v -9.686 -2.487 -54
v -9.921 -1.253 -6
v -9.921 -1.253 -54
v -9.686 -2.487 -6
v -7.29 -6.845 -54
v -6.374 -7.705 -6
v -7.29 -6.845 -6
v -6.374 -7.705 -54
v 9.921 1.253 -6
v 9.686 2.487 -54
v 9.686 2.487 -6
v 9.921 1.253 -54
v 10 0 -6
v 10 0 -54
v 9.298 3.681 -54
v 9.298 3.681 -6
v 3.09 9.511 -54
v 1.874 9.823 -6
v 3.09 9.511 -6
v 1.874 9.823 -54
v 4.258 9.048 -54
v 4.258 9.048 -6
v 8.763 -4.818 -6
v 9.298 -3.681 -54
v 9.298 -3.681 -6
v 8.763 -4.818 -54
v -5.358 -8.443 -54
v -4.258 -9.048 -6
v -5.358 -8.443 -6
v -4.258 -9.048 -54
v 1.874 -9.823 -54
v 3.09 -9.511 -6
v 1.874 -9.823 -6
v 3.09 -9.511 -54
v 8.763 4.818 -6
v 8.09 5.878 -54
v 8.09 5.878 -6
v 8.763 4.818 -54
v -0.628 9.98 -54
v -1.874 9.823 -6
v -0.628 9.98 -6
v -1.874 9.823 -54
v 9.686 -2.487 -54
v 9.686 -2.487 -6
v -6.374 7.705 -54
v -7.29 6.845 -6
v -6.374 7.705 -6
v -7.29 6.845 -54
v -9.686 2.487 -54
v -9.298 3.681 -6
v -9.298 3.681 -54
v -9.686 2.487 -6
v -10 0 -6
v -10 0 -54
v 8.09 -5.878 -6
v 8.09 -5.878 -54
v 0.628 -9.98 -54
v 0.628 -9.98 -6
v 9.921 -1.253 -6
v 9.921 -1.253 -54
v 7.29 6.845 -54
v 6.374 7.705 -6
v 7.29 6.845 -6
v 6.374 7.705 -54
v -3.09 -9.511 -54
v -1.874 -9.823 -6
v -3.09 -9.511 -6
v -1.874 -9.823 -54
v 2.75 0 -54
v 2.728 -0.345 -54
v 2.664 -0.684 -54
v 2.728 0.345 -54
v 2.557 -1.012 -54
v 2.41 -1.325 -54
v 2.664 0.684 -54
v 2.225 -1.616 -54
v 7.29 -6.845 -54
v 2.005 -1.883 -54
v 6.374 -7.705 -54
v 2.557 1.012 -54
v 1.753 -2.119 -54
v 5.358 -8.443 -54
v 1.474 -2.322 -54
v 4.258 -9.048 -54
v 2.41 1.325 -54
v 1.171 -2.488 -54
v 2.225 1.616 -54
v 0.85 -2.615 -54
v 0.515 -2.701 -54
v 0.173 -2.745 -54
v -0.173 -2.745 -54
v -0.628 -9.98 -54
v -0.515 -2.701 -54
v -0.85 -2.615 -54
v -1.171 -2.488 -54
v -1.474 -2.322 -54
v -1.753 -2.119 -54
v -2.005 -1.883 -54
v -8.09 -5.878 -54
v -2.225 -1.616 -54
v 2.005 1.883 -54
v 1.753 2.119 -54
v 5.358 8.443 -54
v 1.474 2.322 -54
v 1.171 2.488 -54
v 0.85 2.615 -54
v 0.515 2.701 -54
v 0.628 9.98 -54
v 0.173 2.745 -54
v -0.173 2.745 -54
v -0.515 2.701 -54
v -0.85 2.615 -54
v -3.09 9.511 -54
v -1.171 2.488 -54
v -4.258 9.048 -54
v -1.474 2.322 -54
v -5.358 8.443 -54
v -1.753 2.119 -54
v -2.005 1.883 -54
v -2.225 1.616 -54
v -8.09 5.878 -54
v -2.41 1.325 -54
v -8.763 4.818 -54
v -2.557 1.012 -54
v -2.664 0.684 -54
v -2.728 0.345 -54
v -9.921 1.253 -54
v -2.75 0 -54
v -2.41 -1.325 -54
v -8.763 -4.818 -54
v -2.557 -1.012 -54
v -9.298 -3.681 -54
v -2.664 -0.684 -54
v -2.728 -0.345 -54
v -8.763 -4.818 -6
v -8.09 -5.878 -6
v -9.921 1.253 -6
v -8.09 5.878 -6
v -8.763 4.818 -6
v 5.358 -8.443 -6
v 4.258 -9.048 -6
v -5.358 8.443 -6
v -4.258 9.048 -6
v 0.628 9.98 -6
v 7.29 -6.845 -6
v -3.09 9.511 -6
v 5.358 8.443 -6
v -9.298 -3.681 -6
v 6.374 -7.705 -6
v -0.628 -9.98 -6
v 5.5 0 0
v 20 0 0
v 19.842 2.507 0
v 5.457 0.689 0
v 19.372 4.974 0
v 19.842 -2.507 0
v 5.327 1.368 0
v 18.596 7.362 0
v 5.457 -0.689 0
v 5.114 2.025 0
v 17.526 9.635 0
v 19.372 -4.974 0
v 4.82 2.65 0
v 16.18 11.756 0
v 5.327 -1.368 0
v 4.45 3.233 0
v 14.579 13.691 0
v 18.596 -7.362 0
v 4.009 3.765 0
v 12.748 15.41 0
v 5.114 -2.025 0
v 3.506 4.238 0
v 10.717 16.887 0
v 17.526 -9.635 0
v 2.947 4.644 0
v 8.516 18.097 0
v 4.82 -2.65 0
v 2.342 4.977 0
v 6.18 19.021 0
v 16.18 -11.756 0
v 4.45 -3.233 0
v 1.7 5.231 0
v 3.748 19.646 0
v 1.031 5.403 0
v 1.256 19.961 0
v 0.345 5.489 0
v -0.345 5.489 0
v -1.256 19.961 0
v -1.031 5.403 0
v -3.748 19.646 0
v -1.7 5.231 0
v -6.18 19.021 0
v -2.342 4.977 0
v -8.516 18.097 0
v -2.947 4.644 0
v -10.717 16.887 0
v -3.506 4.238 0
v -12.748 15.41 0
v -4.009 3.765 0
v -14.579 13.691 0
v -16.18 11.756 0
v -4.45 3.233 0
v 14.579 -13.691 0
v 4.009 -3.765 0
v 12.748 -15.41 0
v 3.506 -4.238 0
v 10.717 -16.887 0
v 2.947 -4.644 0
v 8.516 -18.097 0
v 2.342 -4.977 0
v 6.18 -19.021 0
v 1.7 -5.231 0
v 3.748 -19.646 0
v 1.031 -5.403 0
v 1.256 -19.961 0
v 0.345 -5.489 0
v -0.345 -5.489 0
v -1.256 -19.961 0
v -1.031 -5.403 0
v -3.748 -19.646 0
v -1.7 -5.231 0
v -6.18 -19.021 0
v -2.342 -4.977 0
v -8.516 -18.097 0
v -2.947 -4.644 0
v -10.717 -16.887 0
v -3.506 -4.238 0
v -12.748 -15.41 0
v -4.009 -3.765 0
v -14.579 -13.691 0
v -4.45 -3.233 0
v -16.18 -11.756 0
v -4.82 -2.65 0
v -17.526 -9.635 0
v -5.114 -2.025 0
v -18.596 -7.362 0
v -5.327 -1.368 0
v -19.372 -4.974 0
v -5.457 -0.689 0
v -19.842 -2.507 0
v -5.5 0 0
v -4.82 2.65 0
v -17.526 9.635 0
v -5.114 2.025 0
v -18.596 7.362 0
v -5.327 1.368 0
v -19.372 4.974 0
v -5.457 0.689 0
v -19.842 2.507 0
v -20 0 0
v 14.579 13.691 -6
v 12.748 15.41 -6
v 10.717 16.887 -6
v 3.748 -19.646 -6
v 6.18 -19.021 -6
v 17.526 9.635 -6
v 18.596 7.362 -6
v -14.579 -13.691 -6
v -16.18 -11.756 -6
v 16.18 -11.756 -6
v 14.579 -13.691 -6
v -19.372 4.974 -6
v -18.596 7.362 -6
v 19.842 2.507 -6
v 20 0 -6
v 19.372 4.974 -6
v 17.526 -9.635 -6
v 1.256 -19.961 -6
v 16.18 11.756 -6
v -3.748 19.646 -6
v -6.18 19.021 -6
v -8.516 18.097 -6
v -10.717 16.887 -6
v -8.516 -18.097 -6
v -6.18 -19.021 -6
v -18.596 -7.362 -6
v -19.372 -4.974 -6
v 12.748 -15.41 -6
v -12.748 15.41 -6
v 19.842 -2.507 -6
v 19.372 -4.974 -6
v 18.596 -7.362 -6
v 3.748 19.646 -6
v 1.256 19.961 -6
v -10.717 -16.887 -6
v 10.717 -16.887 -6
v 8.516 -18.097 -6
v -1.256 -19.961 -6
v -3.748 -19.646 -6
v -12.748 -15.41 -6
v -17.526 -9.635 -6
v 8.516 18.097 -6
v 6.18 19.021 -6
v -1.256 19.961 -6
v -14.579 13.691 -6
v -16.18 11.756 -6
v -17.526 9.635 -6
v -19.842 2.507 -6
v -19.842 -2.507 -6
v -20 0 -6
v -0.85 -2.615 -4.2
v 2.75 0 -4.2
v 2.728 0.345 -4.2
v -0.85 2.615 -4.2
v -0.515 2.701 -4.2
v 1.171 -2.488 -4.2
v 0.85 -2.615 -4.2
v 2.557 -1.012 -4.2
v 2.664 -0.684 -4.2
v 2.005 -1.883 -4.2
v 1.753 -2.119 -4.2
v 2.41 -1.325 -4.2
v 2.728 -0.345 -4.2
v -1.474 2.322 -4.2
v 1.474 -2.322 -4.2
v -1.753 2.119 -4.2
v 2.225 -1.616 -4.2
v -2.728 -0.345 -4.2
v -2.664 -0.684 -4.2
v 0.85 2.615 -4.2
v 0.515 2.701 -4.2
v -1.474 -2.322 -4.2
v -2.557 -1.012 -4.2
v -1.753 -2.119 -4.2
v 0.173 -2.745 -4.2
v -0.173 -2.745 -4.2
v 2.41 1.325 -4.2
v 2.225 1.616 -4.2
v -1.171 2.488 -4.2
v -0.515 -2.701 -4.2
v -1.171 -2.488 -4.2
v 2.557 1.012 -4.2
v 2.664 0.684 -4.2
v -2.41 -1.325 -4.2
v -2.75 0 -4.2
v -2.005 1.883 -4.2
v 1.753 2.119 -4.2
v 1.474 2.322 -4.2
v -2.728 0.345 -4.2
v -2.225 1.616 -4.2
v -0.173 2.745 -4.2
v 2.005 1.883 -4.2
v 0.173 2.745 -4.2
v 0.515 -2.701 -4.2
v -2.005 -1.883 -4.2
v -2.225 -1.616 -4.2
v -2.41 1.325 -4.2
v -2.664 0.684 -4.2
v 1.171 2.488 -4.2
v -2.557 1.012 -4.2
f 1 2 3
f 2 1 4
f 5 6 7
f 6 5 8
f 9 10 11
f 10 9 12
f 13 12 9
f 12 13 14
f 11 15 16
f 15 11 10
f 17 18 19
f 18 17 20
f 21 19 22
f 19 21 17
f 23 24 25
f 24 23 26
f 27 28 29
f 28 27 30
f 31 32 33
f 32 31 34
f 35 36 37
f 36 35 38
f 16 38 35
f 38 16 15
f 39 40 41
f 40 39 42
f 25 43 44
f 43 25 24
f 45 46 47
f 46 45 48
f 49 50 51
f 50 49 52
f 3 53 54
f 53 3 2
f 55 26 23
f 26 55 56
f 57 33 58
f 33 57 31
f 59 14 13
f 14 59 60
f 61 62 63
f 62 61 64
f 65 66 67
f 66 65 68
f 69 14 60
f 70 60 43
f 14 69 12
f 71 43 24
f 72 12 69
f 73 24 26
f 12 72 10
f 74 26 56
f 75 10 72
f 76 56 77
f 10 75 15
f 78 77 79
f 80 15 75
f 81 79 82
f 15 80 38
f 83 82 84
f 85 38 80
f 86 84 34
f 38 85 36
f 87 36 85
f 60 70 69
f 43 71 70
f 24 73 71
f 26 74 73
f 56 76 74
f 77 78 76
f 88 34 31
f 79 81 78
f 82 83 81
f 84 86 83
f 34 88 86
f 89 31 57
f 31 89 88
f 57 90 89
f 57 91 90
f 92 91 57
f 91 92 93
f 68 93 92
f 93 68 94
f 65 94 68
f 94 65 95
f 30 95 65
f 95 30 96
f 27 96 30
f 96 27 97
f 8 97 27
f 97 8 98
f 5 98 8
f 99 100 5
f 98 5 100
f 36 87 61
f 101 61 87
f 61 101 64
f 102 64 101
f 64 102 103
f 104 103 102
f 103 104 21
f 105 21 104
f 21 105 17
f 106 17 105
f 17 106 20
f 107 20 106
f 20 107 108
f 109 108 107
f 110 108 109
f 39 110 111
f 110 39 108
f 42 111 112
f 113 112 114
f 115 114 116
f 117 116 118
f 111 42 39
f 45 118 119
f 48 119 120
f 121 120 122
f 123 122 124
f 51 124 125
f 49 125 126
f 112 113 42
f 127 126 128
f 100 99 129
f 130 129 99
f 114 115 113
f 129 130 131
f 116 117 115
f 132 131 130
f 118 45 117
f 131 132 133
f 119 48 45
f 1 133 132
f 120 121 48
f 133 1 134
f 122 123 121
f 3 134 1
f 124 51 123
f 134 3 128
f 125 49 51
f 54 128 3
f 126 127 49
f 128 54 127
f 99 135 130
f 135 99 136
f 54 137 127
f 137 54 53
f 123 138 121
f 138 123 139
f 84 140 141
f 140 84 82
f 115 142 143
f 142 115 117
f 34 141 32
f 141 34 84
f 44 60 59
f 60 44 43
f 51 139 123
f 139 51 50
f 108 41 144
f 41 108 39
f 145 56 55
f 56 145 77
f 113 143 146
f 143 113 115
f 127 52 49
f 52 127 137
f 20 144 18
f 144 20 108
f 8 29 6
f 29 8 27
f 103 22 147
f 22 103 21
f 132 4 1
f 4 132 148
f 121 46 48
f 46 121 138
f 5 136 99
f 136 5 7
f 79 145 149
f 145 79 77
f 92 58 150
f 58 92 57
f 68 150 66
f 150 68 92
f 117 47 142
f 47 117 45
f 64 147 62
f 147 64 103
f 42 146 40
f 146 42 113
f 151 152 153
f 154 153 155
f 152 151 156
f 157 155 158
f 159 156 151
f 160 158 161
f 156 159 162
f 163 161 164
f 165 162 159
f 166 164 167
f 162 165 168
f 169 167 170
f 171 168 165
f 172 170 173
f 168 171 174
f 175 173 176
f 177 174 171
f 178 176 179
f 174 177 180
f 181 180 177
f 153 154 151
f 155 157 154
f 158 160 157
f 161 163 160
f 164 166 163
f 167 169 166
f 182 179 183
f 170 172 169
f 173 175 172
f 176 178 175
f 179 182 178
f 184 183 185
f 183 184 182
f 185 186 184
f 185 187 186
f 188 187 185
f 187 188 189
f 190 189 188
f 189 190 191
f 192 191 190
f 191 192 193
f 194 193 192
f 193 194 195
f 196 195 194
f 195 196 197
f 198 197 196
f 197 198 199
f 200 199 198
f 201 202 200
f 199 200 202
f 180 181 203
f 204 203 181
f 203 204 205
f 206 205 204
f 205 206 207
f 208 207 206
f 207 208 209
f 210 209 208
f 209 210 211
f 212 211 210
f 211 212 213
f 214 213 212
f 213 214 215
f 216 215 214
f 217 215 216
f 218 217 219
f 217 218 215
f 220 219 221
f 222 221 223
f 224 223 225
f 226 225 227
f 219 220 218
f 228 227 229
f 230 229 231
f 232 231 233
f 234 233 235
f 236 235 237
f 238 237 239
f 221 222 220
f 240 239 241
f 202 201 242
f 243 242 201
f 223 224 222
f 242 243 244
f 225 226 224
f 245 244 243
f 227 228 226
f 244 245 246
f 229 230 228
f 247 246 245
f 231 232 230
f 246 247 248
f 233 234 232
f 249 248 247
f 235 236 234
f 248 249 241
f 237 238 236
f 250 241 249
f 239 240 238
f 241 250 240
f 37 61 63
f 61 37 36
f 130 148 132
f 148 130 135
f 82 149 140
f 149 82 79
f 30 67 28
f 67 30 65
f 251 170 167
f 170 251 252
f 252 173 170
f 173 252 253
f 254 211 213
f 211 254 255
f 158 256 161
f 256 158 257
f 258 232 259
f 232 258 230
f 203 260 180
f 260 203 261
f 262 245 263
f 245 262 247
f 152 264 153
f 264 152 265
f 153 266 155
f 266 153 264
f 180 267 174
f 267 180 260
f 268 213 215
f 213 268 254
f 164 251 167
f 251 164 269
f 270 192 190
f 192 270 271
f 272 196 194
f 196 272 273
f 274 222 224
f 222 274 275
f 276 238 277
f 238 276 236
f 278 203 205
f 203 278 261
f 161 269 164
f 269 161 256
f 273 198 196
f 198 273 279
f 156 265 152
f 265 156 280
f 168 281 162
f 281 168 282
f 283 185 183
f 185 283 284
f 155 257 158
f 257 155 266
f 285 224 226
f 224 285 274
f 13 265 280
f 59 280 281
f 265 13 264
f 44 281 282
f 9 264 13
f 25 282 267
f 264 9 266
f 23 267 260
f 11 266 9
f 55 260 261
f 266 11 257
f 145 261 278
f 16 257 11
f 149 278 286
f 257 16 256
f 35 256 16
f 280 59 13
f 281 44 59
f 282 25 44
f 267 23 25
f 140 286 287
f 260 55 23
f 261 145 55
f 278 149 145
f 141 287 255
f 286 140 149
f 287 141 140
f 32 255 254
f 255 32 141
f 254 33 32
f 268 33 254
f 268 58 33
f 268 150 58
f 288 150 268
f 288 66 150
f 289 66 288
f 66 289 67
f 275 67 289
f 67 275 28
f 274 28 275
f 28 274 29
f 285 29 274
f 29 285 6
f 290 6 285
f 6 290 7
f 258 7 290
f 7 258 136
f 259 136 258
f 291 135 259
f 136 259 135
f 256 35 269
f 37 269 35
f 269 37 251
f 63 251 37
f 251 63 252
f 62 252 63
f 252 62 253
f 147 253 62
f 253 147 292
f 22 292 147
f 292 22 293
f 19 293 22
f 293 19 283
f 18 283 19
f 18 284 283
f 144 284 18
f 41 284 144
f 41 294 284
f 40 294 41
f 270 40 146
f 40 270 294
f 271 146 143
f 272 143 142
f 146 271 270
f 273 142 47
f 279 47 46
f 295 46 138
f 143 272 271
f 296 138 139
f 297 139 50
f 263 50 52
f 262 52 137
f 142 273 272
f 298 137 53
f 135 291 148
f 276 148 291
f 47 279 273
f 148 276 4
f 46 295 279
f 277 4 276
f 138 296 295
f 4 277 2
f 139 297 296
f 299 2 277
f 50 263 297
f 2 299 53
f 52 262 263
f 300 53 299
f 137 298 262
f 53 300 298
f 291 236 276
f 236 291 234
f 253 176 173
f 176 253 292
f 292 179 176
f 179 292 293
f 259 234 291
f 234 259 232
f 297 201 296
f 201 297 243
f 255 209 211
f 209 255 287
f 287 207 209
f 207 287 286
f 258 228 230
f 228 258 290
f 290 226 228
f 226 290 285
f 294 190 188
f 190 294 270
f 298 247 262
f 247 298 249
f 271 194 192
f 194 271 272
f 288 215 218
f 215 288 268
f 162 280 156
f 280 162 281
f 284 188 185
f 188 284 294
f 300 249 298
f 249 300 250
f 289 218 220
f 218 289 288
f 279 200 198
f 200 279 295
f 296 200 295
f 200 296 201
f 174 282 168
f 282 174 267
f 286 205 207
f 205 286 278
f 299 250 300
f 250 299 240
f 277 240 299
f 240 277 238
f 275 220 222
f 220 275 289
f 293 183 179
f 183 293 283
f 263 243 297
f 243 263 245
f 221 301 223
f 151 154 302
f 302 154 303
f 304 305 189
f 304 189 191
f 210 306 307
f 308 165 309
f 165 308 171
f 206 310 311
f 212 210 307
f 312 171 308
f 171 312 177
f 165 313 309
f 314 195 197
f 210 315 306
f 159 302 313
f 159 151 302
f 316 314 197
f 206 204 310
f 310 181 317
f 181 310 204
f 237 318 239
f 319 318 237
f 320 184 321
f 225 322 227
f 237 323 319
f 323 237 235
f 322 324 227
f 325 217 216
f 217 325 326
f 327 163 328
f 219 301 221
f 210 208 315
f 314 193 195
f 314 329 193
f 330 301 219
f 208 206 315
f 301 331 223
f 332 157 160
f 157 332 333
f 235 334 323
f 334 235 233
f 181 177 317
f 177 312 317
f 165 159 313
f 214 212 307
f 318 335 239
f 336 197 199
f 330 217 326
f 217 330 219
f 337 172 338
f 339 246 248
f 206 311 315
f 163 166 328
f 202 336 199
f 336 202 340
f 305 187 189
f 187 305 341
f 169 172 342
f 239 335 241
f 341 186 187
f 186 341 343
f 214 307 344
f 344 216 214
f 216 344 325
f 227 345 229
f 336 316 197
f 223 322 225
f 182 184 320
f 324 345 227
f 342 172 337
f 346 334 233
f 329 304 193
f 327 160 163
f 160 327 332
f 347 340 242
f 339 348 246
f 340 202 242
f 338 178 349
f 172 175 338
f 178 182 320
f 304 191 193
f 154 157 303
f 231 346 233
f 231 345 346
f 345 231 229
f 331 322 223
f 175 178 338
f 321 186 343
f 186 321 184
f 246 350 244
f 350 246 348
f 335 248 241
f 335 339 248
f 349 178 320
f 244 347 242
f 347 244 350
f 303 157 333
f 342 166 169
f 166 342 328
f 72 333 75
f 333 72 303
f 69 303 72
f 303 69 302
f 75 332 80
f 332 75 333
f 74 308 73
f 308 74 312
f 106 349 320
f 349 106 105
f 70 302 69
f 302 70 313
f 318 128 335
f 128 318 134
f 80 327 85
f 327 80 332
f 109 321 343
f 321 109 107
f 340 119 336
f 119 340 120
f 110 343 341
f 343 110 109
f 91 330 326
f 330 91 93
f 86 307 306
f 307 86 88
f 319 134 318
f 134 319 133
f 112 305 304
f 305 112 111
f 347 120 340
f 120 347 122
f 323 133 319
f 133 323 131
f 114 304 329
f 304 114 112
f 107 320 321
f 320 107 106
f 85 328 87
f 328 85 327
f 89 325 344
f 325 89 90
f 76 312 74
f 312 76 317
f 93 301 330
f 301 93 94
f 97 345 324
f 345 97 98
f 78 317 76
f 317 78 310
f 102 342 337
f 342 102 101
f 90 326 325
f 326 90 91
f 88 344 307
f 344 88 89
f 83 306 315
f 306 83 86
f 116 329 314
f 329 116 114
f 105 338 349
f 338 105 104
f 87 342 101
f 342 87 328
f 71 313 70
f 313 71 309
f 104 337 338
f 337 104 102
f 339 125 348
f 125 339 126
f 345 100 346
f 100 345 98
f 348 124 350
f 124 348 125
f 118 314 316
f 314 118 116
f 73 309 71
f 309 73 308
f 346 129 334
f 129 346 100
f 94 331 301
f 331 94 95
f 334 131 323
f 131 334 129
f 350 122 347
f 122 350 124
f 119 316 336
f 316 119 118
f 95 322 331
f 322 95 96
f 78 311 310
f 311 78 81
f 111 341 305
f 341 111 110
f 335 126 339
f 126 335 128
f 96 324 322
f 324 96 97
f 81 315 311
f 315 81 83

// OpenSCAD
$fn = 50;


difference() {
	union() {
		translate(v = [0, 0, -54.0000000000]) {
			cylinder(h = 54, r = 10.0000000000);
		}
		translate(v = [0, 0, -6.0000000000]) {
			cylinder(h = 6, r = 20.0000000000);
		}
	}
	union() {
		translate(v = [0, 0, 0]) {
			rotate(a = [0, 0, 0]) {
				difference() {
					union() {
						#translate(v = [0, 0, -54.0000000000]) {
							cylinder(h = 54, r = 2.2500000000);
						}
						#translate(v = [0, 0, -4.2000000000]) {
							cylinder(h = 4.2000000000, r = 10.0000000000, r1 = 2.7500000000, r2 = 5.5000000000);
						}
						#translate(v = [0, 0, -54.0000000000]) {
							cylinder(h = 54, r = 2.7500000000);
						}
						#translate(v = [0, 0, -54.0000000000]) {
							cylinder(h = 54, r = 2.2500000000);
						}
					}
					union();
				}
			}
		}
	}
}
